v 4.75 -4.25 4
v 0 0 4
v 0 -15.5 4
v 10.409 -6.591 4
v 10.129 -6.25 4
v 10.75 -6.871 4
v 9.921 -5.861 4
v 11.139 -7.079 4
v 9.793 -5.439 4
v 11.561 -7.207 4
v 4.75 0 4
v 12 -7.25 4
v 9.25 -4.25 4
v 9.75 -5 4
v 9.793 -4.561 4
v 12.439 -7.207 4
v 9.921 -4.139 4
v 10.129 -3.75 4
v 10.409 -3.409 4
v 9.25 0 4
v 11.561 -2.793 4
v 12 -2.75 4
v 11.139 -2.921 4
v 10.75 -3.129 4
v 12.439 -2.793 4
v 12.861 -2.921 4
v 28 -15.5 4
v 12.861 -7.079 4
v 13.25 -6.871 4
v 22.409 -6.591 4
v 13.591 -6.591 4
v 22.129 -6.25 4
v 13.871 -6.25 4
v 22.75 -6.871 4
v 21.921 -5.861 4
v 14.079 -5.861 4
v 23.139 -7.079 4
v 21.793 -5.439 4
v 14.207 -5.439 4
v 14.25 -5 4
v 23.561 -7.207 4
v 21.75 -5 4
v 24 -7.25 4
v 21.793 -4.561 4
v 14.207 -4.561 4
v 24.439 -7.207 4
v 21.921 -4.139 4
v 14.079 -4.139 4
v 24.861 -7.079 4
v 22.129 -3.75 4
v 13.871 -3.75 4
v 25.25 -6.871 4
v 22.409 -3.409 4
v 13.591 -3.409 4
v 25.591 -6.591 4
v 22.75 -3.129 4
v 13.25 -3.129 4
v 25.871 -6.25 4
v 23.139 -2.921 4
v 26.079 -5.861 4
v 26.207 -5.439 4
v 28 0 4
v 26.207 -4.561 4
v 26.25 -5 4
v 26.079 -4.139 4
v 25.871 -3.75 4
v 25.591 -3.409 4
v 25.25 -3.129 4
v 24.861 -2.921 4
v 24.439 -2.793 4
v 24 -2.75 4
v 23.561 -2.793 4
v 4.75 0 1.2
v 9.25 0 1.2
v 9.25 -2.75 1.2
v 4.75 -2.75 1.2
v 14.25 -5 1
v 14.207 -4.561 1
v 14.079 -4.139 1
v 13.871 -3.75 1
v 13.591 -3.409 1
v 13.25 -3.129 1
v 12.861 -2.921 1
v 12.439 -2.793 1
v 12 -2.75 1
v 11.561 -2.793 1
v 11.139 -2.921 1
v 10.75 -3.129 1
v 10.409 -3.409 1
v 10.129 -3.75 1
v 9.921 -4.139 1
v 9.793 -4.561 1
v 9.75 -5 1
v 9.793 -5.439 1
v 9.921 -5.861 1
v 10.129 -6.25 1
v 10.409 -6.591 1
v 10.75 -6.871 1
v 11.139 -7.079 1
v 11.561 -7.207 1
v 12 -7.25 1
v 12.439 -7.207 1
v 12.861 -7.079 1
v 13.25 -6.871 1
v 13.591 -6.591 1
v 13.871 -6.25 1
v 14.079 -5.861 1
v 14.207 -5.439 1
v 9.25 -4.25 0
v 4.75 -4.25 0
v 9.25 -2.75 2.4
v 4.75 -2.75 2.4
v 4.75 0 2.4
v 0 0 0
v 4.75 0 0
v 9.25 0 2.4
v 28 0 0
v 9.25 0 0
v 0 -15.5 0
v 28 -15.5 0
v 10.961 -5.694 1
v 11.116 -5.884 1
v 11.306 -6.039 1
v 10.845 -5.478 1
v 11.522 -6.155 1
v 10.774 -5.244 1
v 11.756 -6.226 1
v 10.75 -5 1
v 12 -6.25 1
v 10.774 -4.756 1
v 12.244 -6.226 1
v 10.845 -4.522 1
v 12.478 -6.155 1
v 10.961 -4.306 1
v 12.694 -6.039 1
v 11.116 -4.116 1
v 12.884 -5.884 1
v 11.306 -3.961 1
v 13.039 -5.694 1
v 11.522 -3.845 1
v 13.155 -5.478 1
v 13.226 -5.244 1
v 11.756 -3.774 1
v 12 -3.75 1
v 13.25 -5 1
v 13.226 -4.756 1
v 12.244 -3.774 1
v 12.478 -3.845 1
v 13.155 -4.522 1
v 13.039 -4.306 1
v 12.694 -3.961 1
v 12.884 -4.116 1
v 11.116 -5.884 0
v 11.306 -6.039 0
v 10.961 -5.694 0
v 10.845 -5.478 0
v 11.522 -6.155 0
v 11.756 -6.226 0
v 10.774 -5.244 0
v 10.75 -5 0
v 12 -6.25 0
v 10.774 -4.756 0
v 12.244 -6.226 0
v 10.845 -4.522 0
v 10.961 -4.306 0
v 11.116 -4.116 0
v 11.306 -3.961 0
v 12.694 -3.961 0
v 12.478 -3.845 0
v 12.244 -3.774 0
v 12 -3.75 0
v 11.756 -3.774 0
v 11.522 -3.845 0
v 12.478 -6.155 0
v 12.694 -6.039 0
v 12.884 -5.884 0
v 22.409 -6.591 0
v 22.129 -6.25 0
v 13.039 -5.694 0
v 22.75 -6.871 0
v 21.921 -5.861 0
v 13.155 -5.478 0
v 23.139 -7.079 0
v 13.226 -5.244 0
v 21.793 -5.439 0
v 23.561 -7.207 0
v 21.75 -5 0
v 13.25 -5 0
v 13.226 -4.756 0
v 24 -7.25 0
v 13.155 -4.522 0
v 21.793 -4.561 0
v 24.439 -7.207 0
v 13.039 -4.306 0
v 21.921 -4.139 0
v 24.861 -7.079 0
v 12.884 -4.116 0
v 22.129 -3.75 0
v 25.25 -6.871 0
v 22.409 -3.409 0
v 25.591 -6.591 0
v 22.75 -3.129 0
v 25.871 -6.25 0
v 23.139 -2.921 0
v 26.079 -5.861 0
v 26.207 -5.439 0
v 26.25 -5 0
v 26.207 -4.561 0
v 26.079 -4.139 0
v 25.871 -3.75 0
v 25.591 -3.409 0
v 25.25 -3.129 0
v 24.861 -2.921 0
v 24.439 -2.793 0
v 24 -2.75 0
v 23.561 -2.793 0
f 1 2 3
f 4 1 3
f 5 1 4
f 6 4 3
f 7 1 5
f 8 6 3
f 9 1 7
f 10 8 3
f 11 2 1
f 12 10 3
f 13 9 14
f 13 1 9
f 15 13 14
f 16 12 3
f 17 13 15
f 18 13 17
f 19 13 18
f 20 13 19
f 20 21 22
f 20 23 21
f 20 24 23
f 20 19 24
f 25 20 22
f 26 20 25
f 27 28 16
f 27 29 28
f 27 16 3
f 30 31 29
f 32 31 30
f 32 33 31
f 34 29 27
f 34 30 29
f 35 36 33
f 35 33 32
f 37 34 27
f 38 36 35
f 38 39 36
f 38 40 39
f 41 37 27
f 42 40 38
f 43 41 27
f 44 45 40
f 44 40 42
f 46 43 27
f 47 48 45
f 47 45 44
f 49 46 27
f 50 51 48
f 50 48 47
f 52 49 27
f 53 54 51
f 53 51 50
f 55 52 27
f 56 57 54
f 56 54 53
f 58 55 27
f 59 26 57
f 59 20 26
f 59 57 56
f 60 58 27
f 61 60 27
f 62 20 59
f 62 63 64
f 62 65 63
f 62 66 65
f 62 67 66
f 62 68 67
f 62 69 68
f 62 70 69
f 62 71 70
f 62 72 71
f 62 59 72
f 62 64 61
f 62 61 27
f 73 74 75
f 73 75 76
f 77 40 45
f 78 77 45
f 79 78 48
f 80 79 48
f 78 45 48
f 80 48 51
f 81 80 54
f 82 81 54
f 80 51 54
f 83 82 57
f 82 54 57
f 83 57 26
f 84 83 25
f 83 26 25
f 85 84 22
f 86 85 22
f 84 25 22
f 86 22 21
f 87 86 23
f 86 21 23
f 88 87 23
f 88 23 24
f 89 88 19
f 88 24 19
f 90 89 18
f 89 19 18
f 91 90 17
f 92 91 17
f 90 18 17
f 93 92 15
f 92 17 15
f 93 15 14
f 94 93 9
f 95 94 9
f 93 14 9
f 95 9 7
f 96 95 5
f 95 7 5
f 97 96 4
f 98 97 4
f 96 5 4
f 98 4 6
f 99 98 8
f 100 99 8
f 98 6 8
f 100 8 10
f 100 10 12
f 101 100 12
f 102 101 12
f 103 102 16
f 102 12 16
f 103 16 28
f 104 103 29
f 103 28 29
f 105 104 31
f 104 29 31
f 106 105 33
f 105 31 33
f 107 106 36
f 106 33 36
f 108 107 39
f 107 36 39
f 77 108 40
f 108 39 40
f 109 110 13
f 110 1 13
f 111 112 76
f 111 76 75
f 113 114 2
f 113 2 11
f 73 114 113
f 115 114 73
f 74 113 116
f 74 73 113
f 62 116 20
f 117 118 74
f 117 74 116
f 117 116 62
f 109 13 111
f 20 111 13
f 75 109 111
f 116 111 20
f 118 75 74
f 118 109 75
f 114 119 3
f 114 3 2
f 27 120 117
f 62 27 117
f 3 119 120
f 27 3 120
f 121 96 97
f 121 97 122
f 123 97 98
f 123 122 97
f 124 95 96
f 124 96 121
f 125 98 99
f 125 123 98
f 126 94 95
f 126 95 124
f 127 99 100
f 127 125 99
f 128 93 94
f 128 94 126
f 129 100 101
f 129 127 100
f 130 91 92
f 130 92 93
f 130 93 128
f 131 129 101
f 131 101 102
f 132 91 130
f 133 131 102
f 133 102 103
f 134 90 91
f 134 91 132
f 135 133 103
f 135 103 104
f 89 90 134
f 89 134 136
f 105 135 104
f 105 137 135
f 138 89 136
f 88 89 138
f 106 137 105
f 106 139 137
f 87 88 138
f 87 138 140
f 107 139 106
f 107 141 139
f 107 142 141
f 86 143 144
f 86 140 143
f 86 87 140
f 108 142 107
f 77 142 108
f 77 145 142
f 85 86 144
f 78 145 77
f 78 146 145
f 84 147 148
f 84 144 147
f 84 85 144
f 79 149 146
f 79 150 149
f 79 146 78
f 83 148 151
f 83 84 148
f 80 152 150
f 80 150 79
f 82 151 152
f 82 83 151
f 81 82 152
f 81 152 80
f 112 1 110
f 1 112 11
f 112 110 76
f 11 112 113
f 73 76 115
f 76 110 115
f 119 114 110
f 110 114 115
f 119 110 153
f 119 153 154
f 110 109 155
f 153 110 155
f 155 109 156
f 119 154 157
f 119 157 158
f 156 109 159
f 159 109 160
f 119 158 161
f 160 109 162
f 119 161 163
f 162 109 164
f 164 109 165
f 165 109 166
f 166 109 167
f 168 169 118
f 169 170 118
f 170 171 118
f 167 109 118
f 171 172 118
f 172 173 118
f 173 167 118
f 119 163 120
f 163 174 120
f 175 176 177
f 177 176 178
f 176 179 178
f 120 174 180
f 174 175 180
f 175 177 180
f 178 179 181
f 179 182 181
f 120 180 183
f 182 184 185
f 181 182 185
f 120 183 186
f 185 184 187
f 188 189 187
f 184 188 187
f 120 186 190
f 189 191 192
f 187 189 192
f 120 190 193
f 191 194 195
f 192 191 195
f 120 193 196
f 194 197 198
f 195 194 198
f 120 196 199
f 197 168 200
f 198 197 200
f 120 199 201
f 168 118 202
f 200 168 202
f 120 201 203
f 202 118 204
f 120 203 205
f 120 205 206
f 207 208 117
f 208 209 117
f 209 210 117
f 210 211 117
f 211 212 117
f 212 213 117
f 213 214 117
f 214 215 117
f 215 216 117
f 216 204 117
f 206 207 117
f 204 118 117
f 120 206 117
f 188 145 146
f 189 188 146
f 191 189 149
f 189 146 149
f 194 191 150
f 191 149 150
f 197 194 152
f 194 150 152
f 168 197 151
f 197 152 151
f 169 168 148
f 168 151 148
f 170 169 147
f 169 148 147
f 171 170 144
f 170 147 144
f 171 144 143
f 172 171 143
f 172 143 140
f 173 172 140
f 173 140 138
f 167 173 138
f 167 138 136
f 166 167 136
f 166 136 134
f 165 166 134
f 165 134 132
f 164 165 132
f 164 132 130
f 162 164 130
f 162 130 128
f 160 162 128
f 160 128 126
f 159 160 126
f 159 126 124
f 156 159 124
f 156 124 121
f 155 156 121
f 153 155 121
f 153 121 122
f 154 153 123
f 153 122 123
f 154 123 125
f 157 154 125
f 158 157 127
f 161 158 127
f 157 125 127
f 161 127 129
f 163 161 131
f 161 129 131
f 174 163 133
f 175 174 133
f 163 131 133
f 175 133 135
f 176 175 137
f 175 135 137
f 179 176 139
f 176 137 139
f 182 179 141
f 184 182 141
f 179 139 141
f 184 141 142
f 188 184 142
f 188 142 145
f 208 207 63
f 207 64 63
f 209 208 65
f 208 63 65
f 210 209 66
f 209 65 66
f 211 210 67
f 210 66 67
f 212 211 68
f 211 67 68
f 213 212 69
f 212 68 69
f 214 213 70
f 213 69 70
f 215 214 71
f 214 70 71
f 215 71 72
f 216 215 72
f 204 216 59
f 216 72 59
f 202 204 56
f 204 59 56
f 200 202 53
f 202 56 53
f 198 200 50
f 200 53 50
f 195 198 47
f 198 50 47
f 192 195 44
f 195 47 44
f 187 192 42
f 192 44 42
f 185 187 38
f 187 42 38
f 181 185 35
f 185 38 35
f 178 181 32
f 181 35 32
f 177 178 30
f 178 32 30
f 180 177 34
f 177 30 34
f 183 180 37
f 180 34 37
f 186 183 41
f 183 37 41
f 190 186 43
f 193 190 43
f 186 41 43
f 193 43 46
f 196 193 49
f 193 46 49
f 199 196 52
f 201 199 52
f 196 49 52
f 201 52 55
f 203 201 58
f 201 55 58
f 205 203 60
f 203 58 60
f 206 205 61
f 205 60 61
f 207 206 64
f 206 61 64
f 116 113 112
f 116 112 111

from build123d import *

# Parameters (mm, degrees)
SKETCH1_W           = 28
SKETCH1_H           = 15.5
BOSS_EXTRUDE1_DEPTH = 4
SKETCH2_R           = 1.25
CUT_EXTRUDE1_DEPTH  = 4
SKETCH3_R           = 2.25
CUT_EXTRUDE2_DEPTH  = 3
SKETCH4_W           = 4.5
SKETCH4_H           = 4.5
CUT_EXTRUDE3_DEPTH  = 1.6
SKETCH5_W           = 4.5
SKETCH5_H           = 1.5
CUT_EXTRUDE4_DEPTH  = 4
SKETCH6_W           = 4.5
SKETCH6_H           = 4.25
CUT_EXTRUDE5_DEPTH  = 1.2
SKETCH7_R           = 2.25
CUT_EXTRUDE6_DEPTH  = 10


with BuildPart() as part:
    # Sketch1 → Boss-Extrude1 (new body)
    with BuildSketch(Plane.XY):
        with Locations((14, -7.75)):
            Rectangle(SKETCH1_W, SKETCH1_H)
    extrude(amount=BOSS_EXTRUDE1_DEPTH)

    # Sketch2 → Cut-Extrude1 (cut)
    with BuildSketch(Plane.XY.offset(4)):
        with Locations((12, -5)):
            Circle(SKETCH2_R)
        with Locations((24, -5)):
            Circle(SKETCH2_R)
    extrude(amount=-CUT_EXTRUDE1_DEPTH, mode=Mode.SUBTRACT)

    # Sketch3 → Cut-Extrude2 (cut)
    with BuildSketch(Plane.XY.offset(4)):
        with Locations((12, -5)):
            Circle(SKETCH3_R)
        with Locations((24, -5)):
            Circle(SKETCH3_R)
    extrude(amount=-CUT_EXTRUDE2_DEPTH, mode=Mode.SUBTRACT)

    # Sketch4 → Cut-Extrude3 (cut)
    with BuildSketch(Plane.XY.offset(4)):
        with Locations((7, -2)):
            Rectangle(SKETCH4_W, SKETCH4_H)
    extrude(amount=-CUT_EXTRUDE3_DEPTH, mode=Mode.SUBTRACT)

    # Sketch5 → Cut-Extrude4 (cut)
    with BuildSketch(Plane.XY.offset(2.4)):
        with Locations((7, -3.5)):
            Rectangle(SKETCH5_W, SKETCH5_H)
    extrude(amount=-CUT_EXTRUDE4_DEPTH, mode=Mode.SUBTRACT)

    # Sketch6 → Cut-Extrude5 (cut)
    with BuildSketch(Plane(origin=(0, 0, 0), x_dir=(-1, 0, 0), z_dir=(0, 0, -1))):
        with Locations((-7, -2.125)):
            Rectangle(SKETCH6_W, SKETCH6_H)
    extrude(amount=-CUT_EXTRUDE5_DEPTH, mode=Mode.SUBTRACT)

    # Sketch7 → Cut-Extrude6 (cut)
    with BuildSketch(Plane.XY.offset(4)):
        with Locations((24, -5)):
            Circle(SKETCH7_R)
    extrude(amount=-CUT_EXTRUDE6_DEPTH, mode=Mode.SUBTRACT)


solid = part.part
